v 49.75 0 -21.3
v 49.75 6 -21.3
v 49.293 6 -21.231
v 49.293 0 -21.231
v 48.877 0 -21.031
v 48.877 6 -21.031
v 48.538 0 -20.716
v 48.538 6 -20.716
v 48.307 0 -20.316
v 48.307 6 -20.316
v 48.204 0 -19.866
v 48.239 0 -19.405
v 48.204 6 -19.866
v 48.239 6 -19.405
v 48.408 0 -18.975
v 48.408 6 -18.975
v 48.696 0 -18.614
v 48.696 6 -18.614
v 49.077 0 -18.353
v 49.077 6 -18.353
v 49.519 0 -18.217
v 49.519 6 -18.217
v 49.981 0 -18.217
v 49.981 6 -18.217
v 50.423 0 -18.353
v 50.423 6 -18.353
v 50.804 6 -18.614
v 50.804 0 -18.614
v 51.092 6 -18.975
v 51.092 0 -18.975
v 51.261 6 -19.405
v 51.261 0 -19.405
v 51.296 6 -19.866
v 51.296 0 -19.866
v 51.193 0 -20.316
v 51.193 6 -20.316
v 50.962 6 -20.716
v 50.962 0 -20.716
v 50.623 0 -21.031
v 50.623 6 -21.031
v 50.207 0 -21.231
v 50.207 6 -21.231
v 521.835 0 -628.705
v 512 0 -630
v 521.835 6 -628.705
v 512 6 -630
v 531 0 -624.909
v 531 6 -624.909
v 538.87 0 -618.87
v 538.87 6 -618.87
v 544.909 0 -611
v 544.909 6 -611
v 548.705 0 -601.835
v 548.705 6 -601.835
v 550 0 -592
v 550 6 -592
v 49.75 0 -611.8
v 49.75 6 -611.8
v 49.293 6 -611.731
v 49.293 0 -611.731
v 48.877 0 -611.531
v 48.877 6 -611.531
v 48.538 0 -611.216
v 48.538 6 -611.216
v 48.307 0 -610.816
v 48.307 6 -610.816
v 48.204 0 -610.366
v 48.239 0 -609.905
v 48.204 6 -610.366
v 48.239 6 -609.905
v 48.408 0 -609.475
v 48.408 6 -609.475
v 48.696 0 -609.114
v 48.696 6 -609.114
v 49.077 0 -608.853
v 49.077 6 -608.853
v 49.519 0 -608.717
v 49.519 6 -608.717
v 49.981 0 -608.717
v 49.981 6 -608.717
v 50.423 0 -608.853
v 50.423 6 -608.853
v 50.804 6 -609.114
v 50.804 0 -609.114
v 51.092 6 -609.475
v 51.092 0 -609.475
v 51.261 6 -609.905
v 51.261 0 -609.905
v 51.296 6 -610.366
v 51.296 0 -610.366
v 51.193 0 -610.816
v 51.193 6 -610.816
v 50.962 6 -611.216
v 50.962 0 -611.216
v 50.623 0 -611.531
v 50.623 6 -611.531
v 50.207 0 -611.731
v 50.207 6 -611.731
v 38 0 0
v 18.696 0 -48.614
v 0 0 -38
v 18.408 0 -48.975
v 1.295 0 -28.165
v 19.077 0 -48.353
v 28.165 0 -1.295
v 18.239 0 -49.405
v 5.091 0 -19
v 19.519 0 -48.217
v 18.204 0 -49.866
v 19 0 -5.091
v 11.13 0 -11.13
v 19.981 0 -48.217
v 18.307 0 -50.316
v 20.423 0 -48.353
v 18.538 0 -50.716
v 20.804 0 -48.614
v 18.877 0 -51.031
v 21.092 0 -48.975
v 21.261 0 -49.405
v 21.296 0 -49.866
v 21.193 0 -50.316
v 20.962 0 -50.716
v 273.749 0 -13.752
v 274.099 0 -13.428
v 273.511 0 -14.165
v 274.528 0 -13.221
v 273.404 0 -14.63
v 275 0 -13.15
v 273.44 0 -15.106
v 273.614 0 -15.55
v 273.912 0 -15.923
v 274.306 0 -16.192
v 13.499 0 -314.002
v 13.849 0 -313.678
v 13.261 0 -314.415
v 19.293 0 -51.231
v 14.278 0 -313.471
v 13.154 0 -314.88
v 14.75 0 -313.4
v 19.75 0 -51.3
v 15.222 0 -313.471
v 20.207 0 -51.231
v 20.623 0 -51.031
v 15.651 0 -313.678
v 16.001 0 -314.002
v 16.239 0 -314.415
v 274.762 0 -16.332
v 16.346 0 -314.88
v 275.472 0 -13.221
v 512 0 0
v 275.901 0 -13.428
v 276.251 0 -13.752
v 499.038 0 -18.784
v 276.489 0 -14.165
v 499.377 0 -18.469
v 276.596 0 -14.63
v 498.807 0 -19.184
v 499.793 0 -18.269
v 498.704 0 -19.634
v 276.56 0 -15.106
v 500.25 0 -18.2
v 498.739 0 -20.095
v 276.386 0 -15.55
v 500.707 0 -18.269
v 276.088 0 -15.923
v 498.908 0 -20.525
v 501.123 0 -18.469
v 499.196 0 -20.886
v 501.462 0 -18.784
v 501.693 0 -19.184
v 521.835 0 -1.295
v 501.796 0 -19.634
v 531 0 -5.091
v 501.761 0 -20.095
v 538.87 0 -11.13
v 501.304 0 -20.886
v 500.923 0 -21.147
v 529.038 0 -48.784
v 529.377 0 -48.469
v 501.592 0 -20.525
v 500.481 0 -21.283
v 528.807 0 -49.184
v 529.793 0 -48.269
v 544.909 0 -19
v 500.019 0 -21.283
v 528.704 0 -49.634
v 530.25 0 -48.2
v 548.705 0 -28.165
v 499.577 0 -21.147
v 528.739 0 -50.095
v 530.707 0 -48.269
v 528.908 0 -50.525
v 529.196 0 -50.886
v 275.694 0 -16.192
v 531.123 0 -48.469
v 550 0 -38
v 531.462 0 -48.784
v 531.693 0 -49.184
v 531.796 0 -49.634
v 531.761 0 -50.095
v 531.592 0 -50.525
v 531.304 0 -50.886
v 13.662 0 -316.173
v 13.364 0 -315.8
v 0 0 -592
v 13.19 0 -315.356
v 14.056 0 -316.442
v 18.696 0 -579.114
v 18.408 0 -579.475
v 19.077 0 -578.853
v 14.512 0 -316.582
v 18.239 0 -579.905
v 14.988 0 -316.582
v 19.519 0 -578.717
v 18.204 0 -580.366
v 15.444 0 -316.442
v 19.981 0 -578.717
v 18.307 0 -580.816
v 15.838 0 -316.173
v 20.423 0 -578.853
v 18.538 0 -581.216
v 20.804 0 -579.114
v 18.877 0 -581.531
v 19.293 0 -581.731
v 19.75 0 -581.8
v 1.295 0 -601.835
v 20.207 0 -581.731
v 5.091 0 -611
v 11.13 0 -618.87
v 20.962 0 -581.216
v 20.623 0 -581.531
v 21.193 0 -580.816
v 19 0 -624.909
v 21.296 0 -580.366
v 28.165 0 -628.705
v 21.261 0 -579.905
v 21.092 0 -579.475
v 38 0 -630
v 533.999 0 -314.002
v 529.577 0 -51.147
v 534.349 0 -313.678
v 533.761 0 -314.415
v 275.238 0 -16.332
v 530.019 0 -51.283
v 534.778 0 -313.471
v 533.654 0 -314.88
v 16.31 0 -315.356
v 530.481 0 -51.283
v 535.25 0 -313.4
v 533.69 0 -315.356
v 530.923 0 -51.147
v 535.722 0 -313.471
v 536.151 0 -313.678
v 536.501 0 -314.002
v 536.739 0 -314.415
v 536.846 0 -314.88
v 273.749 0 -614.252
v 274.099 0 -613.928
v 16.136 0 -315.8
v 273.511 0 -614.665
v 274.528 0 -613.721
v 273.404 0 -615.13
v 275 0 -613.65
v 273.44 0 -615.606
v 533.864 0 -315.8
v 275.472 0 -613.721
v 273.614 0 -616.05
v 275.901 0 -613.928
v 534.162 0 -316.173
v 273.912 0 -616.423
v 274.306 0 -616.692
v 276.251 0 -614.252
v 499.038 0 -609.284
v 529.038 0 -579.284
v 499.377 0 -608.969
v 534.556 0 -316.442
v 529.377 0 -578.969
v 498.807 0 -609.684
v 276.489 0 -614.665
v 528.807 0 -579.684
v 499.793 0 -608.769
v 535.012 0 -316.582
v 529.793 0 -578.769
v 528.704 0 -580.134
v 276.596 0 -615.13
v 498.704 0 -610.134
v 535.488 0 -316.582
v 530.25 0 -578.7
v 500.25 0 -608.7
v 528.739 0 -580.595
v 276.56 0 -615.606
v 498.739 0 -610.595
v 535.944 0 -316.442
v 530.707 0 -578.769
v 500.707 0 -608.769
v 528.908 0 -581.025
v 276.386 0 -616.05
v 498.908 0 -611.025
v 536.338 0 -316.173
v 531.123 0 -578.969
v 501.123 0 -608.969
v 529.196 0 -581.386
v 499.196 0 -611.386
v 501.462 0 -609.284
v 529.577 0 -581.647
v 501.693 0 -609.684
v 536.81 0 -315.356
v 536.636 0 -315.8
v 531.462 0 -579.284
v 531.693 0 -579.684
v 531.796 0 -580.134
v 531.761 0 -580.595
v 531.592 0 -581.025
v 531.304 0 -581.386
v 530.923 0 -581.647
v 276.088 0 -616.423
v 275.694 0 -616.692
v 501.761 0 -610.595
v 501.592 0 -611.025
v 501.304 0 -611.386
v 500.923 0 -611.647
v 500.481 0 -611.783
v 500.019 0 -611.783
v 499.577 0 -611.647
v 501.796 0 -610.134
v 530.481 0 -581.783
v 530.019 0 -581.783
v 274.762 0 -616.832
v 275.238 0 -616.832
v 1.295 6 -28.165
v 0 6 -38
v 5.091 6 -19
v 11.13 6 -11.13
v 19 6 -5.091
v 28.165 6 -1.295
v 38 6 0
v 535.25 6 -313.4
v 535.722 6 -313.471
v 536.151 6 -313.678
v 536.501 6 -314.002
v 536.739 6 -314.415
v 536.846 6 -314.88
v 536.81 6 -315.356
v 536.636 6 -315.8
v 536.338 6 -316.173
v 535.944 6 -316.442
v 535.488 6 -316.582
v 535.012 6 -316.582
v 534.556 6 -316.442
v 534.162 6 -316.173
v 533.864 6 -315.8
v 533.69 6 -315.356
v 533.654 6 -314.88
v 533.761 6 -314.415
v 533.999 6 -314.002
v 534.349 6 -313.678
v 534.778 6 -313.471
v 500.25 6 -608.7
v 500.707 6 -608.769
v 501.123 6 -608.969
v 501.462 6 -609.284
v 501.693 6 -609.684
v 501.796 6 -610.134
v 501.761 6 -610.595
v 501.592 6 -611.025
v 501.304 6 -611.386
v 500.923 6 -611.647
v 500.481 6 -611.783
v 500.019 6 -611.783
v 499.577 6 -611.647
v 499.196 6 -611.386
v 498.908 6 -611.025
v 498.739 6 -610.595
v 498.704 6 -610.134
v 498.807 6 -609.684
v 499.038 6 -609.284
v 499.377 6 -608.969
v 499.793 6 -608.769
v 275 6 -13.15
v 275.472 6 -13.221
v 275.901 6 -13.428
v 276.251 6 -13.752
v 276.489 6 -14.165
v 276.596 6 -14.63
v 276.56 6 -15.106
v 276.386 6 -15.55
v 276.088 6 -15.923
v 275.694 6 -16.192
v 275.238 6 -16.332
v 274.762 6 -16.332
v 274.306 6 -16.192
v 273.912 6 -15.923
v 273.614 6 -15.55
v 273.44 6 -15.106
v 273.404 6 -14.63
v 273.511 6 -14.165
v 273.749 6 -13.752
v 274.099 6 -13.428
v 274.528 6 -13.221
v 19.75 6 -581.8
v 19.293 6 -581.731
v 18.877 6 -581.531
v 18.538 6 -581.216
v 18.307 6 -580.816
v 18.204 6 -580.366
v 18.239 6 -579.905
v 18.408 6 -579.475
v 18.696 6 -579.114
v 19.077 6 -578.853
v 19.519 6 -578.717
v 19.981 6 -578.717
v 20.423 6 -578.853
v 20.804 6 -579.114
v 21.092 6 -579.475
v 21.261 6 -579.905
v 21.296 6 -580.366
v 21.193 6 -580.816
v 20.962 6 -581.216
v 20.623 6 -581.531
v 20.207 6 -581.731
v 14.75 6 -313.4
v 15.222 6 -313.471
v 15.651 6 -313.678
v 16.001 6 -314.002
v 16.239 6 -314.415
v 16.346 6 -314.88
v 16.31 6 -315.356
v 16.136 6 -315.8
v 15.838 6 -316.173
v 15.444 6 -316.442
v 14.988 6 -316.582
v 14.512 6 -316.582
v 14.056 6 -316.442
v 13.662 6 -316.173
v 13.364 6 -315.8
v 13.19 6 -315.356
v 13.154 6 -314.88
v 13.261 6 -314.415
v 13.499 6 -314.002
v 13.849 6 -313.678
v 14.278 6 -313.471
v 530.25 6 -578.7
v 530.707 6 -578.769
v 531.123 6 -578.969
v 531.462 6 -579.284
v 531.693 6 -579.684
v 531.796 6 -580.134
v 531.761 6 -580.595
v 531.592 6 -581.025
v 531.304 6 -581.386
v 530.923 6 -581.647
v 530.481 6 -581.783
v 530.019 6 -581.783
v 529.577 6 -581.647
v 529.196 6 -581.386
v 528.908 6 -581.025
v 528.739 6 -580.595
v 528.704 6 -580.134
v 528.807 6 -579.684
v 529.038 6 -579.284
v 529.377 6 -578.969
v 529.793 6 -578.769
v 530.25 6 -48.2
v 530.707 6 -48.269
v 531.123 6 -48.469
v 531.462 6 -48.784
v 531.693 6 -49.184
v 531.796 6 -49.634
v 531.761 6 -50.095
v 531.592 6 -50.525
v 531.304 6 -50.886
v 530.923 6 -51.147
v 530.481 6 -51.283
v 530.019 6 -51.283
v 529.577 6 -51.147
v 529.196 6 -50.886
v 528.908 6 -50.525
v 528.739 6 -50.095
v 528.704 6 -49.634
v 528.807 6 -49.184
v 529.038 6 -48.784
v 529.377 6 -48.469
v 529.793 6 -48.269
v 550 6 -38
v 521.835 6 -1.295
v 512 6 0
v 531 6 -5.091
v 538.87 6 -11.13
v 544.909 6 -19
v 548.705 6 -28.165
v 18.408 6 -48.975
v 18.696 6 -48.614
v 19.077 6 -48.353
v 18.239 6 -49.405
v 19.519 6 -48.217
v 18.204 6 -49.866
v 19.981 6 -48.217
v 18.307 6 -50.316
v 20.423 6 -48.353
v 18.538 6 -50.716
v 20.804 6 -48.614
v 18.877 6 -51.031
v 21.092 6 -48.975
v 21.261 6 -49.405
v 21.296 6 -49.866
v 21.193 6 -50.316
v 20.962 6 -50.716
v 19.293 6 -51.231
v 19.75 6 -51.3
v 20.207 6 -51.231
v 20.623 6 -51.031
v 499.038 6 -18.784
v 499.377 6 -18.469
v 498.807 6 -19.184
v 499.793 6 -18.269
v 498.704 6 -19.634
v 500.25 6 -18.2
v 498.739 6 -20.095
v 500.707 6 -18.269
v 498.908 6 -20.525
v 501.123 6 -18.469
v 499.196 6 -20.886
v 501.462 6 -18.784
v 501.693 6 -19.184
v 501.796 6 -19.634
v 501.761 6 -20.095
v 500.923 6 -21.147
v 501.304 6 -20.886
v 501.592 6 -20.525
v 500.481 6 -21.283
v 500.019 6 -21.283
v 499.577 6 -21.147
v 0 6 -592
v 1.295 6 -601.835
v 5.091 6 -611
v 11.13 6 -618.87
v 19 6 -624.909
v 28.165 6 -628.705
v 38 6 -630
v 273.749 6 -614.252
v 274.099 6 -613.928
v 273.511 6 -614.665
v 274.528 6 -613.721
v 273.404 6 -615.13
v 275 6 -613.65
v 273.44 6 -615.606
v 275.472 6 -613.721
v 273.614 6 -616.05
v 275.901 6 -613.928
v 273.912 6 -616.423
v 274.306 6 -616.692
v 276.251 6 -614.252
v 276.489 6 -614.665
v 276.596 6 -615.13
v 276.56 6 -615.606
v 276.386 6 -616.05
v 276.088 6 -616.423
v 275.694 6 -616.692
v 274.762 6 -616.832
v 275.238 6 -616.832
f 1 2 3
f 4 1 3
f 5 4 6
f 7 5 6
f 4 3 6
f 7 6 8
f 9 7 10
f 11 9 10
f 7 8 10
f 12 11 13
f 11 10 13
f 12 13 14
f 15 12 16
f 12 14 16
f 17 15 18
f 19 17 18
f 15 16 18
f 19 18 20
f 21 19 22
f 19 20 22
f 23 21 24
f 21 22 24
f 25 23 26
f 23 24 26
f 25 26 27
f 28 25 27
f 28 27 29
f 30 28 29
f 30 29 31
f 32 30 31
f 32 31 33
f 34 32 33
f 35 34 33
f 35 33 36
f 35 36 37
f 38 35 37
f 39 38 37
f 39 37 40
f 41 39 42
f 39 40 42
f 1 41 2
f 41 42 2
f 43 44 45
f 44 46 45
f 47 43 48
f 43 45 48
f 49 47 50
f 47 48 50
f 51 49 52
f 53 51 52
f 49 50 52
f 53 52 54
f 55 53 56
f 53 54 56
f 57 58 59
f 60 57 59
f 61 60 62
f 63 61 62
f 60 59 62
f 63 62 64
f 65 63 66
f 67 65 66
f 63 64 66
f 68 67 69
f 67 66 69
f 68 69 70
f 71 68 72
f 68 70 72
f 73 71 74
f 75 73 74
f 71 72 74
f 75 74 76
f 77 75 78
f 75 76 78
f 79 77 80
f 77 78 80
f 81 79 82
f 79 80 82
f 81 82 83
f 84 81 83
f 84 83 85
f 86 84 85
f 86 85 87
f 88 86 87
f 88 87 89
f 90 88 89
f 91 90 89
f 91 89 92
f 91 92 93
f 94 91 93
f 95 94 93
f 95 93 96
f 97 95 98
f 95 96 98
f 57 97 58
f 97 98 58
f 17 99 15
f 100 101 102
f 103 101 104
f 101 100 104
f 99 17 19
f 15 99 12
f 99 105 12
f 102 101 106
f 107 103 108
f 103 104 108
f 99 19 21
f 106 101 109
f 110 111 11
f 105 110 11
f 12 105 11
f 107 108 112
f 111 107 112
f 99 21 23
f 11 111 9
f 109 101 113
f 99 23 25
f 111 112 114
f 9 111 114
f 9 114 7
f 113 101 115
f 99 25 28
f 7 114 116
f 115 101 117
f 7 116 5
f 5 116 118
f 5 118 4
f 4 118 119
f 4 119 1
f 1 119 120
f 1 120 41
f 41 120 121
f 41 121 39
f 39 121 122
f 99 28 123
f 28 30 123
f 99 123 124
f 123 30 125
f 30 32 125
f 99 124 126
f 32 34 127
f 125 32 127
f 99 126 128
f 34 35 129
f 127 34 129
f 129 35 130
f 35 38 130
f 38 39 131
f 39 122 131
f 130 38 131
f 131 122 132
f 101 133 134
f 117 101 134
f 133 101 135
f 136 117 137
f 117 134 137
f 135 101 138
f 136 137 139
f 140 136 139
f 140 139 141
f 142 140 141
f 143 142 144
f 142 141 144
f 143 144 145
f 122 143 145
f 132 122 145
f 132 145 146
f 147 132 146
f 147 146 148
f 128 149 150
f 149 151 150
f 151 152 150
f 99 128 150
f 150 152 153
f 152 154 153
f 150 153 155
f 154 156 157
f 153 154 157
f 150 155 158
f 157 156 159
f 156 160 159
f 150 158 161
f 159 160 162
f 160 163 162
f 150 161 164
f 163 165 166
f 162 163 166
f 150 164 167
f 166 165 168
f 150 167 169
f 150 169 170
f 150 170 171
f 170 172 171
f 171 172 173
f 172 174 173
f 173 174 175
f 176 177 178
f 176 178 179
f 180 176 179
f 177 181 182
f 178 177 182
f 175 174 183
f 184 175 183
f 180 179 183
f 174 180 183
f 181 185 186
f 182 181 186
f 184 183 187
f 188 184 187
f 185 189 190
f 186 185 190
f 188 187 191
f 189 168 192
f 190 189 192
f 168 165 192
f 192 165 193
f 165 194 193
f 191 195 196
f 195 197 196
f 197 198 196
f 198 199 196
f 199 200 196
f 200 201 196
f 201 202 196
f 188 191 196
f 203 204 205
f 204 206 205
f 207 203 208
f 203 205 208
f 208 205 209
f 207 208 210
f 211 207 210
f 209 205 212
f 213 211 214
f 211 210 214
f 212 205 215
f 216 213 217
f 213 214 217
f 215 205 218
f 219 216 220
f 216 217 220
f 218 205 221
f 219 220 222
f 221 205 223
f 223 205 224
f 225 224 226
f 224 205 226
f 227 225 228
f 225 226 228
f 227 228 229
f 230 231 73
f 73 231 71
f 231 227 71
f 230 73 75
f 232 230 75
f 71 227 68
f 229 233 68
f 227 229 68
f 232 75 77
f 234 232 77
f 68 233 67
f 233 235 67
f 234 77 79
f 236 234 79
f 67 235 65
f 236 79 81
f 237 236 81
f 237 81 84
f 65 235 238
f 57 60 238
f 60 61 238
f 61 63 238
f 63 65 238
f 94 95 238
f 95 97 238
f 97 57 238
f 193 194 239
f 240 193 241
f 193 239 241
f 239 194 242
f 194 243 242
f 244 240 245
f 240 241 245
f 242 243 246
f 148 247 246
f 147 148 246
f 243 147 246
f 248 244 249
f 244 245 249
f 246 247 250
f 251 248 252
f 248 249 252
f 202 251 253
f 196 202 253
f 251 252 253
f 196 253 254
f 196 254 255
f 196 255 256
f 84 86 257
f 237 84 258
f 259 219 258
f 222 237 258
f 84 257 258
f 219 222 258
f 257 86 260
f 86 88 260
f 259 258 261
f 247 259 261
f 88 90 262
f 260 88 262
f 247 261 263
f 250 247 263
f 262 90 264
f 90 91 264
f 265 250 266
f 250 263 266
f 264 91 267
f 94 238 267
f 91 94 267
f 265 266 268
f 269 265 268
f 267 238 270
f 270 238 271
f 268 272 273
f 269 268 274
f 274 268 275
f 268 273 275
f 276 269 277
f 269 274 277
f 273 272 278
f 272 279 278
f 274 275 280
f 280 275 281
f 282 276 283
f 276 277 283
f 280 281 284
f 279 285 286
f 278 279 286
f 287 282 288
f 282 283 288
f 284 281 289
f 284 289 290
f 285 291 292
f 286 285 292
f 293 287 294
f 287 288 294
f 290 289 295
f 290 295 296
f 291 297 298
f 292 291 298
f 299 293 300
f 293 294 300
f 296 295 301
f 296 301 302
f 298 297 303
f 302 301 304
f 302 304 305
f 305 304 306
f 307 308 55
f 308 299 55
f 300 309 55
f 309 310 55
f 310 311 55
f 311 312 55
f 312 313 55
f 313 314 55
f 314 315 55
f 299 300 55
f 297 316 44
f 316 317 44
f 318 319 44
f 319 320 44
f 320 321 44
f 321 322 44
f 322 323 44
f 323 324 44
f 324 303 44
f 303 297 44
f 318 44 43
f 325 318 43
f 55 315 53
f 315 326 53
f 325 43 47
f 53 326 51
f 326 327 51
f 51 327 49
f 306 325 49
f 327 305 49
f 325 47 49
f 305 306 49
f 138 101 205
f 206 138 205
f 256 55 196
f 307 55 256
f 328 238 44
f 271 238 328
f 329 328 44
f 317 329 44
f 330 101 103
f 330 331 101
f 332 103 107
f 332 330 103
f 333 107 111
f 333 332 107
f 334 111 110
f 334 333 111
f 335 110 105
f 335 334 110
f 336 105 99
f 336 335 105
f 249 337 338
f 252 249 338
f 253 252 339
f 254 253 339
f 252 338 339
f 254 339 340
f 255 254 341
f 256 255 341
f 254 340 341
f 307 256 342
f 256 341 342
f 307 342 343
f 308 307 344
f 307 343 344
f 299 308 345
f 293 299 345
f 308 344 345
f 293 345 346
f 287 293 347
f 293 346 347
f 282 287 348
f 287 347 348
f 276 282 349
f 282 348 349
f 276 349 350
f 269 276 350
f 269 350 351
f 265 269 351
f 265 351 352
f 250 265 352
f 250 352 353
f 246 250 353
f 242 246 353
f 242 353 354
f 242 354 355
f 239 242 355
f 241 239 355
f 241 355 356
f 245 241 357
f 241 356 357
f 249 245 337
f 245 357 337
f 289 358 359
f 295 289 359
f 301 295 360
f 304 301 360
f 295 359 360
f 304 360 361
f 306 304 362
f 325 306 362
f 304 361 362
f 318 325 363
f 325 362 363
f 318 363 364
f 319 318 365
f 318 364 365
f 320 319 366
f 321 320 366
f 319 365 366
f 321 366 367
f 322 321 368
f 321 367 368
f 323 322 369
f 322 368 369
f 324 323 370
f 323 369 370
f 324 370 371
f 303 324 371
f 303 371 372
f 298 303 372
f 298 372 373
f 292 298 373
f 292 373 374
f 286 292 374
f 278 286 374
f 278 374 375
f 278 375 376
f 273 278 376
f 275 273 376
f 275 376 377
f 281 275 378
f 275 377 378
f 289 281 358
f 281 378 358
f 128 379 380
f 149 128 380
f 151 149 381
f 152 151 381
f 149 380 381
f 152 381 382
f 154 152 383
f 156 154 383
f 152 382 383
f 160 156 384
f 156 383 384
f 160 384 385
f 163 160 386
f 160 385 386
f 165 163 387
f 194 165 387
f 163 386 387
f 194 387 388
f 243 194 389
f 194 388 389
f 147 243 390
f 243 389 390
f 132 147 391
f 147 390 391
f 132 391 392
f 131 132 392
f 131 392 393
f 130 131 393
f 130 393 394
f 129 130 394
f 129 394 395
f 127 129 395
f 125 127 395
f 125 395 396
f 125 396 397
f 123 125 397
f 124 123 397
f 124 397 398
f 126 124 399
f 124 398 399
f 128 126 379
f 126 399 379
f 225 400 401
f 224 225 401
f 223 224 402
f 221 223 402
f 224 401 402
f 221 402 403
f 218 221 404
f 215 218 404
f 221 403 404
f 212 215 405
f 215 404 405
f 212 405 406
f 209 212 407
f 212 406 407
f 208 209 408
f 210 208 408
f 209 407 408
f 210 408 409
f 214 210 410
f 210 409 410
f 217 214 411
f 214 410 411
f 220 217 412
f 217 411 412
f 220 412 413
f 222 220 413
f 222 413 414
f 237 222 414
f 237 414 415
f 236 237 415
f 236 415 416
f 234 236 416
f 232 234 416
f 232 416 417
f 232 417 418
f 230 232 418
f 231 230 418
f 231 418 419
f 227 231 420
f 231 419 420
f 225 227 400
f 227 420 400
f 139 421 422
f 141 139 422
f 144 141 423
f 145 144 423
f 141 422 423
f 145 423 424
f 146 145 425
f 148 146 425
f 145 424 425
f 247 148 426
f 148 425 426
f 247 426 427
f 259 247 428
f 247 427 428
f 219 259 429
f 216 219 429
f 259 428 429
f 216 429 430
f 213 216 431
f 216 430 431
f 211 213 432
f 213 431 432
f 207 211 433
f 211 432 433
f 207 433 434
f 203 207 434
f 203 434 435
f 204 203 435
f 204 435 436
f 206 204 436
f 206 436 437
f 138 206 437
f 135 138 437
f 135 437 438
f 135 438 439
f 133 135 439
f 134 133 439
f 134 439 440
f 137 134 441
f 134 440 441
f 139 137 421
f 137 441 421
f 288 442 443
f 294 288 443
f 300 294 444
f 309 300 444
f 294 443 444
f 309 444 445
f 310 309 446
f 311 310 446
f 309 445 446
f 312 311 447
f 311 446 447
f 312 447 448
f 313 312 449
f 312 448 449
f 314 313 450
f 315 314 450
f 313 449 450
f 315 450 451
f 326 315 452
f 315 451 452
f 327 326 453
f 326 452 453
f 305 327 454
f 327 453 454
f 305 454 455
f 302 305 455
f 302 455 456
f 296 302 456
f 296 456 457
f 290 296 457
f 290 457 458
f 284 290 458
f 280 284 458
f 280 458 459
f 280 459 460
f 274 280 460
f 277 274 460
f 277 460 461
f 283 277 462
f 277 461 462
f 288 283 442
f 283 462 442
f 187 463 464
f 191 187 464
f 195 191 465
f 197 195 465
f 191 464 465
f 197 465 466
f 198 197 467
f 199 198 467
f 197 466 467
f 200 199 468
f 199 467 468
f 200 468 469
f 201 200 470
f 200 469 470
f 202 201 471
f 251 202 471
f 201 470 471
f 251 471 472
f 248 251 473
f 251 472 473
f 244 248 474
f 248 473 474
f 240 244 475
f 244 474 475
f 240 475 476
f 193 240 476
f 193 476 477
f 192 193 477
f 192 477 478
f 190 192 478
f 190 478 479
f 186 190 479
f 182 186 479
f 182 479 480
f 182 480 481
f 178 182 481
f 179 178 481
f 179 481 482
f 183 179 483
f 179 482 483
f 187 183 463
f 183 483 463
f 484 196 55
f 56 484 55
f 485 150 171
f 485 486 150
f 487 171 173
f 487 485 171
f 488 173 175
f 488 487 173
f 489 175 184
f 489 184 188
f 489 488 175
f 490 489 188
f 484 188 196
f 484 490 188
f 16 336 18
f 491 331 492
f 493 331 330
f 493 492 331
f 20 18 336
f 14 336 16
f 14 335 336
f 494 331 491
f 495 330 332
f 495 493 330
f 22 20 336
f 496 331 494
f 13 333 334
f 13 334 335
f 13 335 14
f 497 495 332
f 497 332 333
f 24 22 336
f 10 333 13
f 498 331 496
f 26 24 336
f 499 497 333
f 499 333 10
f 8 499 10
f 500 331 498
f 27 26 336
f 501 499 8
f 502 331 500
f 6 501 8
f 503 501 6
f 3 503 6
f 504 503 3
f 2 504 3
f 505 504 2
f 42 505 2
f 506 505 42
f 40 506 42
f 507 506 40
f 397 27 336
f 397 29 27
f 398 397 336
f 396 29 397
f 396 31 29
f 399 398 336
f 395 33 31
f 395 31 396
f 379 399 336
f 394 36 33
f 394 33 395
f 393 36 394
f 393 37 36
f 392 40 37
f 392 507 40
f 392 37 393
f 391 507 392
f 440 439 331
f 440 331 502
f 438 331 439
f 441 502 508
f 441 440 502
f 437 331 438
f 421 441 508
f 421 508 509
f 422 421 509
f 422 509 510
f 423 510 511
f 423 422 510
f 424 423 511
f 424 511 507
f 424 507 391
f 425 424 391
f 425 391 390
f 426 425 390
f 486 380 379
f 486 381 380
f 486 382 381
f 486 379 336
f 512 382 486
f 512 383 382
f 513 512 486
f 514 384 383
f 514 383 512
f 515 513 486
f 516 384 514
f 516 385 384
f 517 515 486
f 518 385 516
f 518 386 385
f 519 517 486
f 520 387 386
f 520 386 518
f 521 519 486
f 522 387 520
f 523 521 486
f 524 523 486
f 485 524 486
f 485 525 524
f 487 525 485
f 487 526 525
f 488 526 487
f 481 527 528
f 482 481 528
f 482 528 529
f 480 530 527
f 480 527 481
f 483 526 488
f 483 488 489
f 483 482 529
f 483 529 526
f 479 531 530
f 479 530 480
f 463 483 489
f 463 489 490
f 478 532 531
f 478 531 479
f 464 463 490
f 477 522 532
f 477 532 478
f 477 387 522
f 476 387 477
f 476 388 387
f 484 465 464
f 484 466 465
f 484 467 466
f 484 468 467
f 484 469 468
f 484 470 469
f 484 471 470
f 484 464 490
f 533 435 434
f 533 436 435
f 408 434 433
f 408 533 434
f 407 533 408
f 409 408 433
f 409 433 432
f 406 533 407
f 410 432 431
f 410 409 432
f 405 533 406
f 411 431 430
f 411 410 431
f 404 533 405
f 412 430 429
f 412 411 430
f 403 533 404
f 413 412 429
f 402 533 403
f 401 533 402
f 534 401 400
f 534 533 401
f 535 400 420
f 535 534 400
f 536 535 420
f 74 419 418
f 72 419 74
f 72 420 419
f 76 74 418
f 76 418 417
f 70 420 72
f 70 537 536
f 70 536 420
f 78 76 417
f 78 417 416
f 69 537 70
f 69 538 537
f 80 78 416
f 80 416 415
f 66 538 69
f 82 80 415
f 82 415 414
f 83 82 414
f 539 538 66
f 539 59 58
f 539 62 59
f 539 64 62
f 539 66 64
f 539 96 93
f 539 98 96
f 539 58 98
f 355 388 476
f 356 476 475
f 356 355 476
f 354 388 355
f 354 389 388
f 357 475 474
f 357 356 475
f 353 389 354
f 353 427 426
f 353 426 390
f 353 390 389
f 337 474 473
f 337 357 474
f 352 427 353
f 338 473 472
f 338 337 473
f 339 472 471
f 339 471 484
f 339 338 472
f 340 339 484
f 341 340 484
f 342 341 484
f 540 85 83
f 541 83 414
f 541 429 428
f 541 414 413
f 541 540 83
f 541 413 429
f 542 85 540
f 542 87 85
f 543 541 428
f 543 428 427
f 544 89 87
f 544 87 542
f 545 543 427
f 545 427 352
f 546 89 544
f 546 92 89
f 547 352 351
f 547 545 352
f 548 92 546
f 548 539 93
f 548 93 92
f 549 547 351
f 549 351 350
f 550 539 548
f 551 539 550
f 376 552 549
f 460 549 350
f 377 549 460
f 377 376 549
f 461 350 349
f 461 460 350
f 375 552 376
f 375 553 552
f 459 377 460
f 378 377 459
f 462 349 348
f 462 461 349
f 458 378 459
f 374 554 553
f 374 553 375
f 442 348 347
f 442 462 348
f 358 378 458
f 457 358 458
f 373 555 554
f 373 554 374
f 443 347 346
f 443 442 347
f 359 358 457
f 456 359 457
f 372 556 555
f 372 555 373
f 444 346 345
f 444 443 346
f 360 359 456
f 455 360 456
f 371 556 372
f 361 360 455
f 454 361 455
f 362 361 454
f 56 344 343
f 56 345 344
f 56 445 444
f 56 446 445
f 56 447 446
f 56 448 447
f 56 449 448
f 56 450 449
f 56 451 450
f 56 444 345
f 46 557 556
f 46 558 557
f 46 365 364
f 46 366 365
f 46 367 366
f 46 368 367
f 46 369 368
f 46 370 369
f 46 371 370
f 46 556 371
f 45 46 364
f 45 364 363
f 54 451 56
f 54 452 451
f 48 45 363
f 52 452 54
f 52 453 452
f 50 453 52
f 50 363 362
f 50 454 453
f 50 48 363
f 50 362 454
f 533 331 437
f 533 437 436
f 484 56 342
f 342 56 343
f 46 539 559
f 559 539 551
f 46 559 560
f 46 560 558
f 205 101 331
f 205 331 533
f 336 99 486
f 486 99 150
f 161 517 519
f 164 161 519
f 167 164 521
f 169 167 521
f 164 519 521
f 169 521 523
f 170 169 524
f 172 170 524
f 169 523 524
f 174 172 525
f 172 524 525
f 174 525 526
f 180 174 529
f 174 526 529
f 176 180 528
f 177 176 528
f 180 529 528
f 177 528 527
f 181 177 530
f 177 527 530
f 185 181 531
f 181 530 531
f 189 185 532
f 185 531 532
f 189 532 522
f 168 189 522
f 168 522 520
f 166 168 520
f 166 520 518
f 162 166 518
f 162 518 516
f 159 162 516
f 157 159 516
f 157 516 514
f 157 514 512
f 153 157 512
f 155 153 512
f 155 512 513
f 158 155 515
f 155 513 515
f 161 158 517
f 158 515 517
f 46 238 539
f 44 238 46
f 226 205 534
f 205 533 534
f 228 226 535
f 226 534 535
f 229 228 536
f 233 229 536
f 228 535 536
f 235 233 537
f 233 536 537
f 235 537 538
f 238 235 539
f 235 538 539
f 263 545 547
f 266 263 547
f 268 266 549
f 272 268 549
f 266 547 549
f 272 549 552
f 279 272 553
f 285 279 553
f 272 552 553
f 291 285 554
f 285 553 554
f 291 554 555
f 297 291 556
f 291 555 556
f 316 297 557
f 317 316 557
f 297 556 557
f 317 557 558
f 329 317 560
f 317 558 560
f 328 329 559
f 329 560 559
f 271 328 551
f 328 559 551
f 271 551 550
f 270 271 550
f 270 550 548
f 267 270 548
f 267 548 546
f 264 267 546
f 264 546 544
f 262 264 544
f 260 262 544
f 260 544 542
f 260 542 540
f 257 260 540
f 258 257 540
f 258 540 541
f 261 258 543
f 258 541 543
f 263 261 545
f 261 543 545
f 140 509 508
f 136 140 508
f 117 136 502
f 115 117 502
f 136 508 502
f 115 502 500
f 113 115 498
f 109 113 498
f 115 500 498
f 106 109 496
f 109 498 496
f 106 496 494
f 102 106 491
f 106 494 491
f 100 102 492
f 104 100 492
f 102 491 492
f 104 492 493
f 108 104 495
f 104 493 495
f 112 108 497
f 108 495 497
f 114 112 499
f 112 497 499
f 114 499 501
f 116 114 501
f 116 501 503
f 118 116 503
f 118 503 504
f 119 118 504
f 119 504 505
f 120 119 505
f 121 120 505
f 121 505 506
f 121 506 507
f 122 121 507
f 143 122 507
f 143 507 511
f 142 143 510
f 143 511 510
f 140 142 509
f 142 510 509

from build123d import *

# Parameters (mm, degrees)
CROQUIS1_W              = 550
CROQUIS1_H              = 630
SALIENTE_EXTRUIR1_DEPTH = 6
CROQUIS2_R              = 1.55
CORTAR_EXTRUIR1_DEPTH   = 6
REDONDEO1_R             = 38
CROQUIS3_R              = 1.6
CORTAR_EXTRUIR2_DEPTH   = 6


with BuildPart() as part:
    # Croquis1 → Saliente-Extruir1 (new body)
    with BuildSketch(Plane(origin=(0, 0, 0), x_dir=(1, 0, 0), z_dir=(0, 1, 0))):
        with Locations((275, 315)):
            Rectangle(CROQUIS1_W, CROQUIS1_H)
    extrude(amount=SALIENTE_EXTRUIR1_DEPTH)

    # Croquis2 → Cortar-Extruir1 (cut)
    with BuildSketch(Plane(origin=(0, 6, 0), x_dir=(1, 0, 0), z_dir=(0, 1, 0))):
        with Locations(Location((500.25, 610.25, 0), (0, 0, 270))):
            Circle(CROQUIS2_R)
        with Locations(Location((530.25, 580.25, 0), (0, 0, 270))):
            Circle(CROQUIS2_R)
        with Locations(Location((530.25, 49.75, 0), (0, 0, 270))):
            Circle(CROQUIS2_R)
        with Locations(Location((19.75, 580.25, 0), (0, 0, 90))):
            Circle(CROQUIS2_R)
        with Locations(Location((19.75, 49.75, 0), (0, 0, 90))):
            Circle(CROQUIS2_R)
        with Locations(Location((500.25, 19.75, 0), (0, 0, 270))):
            Circle(CROQUIS2_R)
        with Locations(Location((49.75, 610.25, 0), (0, 0, 90))):
            Circle(CROQUIS2_R)
        with Locations(Location((49.75, 19.75, 0), (0, 0, 90))):
            Circle(CROQUIS2_R)
    extrude(amount=-CORTAR_EXTRUIR1_DEPTH, mode=Mode.SUBTRACT)

    # Redondeo1
    redondeo1_edges = [part.edges().sort_by_distance(p)[0] for p in [
        (0, 3, -630),
        (550, 3, -630),
        (550, 3, 0),
        (0, 3, 0),
    ]]
    fillet(redondeo1_edges, radius=REDONDEO1_R)

    # Croquis3 → Cortar-Extruir2 (cut)
    with BuildSketch(Plane(origin=(0, 6, 0), x_dir=(1, 0, 0), z_dir=(0, 1, 0))):
        with Locations(Location((275, 615.25, 0), (0, 0, 270))):
            Circle(CROQUIS3_R)
        with Locations(Location((14.75, 315, 0), (0, 0, 270))):
            Circle(CROQUIS3_R)
        with Locations(Location((535.25, 315, 0), (0, 0, 270))):
            Circle(CROQUIS3_R)
        with Locations(Location((275, 14.75, 0), (0, 0, 270))):
            Circle(CROQUIS3_R)
    extrude(amount=-CORTAR_EXTRUIR2_DEPTH, mode=Mode.SUBTRACT)


solid = part.part
